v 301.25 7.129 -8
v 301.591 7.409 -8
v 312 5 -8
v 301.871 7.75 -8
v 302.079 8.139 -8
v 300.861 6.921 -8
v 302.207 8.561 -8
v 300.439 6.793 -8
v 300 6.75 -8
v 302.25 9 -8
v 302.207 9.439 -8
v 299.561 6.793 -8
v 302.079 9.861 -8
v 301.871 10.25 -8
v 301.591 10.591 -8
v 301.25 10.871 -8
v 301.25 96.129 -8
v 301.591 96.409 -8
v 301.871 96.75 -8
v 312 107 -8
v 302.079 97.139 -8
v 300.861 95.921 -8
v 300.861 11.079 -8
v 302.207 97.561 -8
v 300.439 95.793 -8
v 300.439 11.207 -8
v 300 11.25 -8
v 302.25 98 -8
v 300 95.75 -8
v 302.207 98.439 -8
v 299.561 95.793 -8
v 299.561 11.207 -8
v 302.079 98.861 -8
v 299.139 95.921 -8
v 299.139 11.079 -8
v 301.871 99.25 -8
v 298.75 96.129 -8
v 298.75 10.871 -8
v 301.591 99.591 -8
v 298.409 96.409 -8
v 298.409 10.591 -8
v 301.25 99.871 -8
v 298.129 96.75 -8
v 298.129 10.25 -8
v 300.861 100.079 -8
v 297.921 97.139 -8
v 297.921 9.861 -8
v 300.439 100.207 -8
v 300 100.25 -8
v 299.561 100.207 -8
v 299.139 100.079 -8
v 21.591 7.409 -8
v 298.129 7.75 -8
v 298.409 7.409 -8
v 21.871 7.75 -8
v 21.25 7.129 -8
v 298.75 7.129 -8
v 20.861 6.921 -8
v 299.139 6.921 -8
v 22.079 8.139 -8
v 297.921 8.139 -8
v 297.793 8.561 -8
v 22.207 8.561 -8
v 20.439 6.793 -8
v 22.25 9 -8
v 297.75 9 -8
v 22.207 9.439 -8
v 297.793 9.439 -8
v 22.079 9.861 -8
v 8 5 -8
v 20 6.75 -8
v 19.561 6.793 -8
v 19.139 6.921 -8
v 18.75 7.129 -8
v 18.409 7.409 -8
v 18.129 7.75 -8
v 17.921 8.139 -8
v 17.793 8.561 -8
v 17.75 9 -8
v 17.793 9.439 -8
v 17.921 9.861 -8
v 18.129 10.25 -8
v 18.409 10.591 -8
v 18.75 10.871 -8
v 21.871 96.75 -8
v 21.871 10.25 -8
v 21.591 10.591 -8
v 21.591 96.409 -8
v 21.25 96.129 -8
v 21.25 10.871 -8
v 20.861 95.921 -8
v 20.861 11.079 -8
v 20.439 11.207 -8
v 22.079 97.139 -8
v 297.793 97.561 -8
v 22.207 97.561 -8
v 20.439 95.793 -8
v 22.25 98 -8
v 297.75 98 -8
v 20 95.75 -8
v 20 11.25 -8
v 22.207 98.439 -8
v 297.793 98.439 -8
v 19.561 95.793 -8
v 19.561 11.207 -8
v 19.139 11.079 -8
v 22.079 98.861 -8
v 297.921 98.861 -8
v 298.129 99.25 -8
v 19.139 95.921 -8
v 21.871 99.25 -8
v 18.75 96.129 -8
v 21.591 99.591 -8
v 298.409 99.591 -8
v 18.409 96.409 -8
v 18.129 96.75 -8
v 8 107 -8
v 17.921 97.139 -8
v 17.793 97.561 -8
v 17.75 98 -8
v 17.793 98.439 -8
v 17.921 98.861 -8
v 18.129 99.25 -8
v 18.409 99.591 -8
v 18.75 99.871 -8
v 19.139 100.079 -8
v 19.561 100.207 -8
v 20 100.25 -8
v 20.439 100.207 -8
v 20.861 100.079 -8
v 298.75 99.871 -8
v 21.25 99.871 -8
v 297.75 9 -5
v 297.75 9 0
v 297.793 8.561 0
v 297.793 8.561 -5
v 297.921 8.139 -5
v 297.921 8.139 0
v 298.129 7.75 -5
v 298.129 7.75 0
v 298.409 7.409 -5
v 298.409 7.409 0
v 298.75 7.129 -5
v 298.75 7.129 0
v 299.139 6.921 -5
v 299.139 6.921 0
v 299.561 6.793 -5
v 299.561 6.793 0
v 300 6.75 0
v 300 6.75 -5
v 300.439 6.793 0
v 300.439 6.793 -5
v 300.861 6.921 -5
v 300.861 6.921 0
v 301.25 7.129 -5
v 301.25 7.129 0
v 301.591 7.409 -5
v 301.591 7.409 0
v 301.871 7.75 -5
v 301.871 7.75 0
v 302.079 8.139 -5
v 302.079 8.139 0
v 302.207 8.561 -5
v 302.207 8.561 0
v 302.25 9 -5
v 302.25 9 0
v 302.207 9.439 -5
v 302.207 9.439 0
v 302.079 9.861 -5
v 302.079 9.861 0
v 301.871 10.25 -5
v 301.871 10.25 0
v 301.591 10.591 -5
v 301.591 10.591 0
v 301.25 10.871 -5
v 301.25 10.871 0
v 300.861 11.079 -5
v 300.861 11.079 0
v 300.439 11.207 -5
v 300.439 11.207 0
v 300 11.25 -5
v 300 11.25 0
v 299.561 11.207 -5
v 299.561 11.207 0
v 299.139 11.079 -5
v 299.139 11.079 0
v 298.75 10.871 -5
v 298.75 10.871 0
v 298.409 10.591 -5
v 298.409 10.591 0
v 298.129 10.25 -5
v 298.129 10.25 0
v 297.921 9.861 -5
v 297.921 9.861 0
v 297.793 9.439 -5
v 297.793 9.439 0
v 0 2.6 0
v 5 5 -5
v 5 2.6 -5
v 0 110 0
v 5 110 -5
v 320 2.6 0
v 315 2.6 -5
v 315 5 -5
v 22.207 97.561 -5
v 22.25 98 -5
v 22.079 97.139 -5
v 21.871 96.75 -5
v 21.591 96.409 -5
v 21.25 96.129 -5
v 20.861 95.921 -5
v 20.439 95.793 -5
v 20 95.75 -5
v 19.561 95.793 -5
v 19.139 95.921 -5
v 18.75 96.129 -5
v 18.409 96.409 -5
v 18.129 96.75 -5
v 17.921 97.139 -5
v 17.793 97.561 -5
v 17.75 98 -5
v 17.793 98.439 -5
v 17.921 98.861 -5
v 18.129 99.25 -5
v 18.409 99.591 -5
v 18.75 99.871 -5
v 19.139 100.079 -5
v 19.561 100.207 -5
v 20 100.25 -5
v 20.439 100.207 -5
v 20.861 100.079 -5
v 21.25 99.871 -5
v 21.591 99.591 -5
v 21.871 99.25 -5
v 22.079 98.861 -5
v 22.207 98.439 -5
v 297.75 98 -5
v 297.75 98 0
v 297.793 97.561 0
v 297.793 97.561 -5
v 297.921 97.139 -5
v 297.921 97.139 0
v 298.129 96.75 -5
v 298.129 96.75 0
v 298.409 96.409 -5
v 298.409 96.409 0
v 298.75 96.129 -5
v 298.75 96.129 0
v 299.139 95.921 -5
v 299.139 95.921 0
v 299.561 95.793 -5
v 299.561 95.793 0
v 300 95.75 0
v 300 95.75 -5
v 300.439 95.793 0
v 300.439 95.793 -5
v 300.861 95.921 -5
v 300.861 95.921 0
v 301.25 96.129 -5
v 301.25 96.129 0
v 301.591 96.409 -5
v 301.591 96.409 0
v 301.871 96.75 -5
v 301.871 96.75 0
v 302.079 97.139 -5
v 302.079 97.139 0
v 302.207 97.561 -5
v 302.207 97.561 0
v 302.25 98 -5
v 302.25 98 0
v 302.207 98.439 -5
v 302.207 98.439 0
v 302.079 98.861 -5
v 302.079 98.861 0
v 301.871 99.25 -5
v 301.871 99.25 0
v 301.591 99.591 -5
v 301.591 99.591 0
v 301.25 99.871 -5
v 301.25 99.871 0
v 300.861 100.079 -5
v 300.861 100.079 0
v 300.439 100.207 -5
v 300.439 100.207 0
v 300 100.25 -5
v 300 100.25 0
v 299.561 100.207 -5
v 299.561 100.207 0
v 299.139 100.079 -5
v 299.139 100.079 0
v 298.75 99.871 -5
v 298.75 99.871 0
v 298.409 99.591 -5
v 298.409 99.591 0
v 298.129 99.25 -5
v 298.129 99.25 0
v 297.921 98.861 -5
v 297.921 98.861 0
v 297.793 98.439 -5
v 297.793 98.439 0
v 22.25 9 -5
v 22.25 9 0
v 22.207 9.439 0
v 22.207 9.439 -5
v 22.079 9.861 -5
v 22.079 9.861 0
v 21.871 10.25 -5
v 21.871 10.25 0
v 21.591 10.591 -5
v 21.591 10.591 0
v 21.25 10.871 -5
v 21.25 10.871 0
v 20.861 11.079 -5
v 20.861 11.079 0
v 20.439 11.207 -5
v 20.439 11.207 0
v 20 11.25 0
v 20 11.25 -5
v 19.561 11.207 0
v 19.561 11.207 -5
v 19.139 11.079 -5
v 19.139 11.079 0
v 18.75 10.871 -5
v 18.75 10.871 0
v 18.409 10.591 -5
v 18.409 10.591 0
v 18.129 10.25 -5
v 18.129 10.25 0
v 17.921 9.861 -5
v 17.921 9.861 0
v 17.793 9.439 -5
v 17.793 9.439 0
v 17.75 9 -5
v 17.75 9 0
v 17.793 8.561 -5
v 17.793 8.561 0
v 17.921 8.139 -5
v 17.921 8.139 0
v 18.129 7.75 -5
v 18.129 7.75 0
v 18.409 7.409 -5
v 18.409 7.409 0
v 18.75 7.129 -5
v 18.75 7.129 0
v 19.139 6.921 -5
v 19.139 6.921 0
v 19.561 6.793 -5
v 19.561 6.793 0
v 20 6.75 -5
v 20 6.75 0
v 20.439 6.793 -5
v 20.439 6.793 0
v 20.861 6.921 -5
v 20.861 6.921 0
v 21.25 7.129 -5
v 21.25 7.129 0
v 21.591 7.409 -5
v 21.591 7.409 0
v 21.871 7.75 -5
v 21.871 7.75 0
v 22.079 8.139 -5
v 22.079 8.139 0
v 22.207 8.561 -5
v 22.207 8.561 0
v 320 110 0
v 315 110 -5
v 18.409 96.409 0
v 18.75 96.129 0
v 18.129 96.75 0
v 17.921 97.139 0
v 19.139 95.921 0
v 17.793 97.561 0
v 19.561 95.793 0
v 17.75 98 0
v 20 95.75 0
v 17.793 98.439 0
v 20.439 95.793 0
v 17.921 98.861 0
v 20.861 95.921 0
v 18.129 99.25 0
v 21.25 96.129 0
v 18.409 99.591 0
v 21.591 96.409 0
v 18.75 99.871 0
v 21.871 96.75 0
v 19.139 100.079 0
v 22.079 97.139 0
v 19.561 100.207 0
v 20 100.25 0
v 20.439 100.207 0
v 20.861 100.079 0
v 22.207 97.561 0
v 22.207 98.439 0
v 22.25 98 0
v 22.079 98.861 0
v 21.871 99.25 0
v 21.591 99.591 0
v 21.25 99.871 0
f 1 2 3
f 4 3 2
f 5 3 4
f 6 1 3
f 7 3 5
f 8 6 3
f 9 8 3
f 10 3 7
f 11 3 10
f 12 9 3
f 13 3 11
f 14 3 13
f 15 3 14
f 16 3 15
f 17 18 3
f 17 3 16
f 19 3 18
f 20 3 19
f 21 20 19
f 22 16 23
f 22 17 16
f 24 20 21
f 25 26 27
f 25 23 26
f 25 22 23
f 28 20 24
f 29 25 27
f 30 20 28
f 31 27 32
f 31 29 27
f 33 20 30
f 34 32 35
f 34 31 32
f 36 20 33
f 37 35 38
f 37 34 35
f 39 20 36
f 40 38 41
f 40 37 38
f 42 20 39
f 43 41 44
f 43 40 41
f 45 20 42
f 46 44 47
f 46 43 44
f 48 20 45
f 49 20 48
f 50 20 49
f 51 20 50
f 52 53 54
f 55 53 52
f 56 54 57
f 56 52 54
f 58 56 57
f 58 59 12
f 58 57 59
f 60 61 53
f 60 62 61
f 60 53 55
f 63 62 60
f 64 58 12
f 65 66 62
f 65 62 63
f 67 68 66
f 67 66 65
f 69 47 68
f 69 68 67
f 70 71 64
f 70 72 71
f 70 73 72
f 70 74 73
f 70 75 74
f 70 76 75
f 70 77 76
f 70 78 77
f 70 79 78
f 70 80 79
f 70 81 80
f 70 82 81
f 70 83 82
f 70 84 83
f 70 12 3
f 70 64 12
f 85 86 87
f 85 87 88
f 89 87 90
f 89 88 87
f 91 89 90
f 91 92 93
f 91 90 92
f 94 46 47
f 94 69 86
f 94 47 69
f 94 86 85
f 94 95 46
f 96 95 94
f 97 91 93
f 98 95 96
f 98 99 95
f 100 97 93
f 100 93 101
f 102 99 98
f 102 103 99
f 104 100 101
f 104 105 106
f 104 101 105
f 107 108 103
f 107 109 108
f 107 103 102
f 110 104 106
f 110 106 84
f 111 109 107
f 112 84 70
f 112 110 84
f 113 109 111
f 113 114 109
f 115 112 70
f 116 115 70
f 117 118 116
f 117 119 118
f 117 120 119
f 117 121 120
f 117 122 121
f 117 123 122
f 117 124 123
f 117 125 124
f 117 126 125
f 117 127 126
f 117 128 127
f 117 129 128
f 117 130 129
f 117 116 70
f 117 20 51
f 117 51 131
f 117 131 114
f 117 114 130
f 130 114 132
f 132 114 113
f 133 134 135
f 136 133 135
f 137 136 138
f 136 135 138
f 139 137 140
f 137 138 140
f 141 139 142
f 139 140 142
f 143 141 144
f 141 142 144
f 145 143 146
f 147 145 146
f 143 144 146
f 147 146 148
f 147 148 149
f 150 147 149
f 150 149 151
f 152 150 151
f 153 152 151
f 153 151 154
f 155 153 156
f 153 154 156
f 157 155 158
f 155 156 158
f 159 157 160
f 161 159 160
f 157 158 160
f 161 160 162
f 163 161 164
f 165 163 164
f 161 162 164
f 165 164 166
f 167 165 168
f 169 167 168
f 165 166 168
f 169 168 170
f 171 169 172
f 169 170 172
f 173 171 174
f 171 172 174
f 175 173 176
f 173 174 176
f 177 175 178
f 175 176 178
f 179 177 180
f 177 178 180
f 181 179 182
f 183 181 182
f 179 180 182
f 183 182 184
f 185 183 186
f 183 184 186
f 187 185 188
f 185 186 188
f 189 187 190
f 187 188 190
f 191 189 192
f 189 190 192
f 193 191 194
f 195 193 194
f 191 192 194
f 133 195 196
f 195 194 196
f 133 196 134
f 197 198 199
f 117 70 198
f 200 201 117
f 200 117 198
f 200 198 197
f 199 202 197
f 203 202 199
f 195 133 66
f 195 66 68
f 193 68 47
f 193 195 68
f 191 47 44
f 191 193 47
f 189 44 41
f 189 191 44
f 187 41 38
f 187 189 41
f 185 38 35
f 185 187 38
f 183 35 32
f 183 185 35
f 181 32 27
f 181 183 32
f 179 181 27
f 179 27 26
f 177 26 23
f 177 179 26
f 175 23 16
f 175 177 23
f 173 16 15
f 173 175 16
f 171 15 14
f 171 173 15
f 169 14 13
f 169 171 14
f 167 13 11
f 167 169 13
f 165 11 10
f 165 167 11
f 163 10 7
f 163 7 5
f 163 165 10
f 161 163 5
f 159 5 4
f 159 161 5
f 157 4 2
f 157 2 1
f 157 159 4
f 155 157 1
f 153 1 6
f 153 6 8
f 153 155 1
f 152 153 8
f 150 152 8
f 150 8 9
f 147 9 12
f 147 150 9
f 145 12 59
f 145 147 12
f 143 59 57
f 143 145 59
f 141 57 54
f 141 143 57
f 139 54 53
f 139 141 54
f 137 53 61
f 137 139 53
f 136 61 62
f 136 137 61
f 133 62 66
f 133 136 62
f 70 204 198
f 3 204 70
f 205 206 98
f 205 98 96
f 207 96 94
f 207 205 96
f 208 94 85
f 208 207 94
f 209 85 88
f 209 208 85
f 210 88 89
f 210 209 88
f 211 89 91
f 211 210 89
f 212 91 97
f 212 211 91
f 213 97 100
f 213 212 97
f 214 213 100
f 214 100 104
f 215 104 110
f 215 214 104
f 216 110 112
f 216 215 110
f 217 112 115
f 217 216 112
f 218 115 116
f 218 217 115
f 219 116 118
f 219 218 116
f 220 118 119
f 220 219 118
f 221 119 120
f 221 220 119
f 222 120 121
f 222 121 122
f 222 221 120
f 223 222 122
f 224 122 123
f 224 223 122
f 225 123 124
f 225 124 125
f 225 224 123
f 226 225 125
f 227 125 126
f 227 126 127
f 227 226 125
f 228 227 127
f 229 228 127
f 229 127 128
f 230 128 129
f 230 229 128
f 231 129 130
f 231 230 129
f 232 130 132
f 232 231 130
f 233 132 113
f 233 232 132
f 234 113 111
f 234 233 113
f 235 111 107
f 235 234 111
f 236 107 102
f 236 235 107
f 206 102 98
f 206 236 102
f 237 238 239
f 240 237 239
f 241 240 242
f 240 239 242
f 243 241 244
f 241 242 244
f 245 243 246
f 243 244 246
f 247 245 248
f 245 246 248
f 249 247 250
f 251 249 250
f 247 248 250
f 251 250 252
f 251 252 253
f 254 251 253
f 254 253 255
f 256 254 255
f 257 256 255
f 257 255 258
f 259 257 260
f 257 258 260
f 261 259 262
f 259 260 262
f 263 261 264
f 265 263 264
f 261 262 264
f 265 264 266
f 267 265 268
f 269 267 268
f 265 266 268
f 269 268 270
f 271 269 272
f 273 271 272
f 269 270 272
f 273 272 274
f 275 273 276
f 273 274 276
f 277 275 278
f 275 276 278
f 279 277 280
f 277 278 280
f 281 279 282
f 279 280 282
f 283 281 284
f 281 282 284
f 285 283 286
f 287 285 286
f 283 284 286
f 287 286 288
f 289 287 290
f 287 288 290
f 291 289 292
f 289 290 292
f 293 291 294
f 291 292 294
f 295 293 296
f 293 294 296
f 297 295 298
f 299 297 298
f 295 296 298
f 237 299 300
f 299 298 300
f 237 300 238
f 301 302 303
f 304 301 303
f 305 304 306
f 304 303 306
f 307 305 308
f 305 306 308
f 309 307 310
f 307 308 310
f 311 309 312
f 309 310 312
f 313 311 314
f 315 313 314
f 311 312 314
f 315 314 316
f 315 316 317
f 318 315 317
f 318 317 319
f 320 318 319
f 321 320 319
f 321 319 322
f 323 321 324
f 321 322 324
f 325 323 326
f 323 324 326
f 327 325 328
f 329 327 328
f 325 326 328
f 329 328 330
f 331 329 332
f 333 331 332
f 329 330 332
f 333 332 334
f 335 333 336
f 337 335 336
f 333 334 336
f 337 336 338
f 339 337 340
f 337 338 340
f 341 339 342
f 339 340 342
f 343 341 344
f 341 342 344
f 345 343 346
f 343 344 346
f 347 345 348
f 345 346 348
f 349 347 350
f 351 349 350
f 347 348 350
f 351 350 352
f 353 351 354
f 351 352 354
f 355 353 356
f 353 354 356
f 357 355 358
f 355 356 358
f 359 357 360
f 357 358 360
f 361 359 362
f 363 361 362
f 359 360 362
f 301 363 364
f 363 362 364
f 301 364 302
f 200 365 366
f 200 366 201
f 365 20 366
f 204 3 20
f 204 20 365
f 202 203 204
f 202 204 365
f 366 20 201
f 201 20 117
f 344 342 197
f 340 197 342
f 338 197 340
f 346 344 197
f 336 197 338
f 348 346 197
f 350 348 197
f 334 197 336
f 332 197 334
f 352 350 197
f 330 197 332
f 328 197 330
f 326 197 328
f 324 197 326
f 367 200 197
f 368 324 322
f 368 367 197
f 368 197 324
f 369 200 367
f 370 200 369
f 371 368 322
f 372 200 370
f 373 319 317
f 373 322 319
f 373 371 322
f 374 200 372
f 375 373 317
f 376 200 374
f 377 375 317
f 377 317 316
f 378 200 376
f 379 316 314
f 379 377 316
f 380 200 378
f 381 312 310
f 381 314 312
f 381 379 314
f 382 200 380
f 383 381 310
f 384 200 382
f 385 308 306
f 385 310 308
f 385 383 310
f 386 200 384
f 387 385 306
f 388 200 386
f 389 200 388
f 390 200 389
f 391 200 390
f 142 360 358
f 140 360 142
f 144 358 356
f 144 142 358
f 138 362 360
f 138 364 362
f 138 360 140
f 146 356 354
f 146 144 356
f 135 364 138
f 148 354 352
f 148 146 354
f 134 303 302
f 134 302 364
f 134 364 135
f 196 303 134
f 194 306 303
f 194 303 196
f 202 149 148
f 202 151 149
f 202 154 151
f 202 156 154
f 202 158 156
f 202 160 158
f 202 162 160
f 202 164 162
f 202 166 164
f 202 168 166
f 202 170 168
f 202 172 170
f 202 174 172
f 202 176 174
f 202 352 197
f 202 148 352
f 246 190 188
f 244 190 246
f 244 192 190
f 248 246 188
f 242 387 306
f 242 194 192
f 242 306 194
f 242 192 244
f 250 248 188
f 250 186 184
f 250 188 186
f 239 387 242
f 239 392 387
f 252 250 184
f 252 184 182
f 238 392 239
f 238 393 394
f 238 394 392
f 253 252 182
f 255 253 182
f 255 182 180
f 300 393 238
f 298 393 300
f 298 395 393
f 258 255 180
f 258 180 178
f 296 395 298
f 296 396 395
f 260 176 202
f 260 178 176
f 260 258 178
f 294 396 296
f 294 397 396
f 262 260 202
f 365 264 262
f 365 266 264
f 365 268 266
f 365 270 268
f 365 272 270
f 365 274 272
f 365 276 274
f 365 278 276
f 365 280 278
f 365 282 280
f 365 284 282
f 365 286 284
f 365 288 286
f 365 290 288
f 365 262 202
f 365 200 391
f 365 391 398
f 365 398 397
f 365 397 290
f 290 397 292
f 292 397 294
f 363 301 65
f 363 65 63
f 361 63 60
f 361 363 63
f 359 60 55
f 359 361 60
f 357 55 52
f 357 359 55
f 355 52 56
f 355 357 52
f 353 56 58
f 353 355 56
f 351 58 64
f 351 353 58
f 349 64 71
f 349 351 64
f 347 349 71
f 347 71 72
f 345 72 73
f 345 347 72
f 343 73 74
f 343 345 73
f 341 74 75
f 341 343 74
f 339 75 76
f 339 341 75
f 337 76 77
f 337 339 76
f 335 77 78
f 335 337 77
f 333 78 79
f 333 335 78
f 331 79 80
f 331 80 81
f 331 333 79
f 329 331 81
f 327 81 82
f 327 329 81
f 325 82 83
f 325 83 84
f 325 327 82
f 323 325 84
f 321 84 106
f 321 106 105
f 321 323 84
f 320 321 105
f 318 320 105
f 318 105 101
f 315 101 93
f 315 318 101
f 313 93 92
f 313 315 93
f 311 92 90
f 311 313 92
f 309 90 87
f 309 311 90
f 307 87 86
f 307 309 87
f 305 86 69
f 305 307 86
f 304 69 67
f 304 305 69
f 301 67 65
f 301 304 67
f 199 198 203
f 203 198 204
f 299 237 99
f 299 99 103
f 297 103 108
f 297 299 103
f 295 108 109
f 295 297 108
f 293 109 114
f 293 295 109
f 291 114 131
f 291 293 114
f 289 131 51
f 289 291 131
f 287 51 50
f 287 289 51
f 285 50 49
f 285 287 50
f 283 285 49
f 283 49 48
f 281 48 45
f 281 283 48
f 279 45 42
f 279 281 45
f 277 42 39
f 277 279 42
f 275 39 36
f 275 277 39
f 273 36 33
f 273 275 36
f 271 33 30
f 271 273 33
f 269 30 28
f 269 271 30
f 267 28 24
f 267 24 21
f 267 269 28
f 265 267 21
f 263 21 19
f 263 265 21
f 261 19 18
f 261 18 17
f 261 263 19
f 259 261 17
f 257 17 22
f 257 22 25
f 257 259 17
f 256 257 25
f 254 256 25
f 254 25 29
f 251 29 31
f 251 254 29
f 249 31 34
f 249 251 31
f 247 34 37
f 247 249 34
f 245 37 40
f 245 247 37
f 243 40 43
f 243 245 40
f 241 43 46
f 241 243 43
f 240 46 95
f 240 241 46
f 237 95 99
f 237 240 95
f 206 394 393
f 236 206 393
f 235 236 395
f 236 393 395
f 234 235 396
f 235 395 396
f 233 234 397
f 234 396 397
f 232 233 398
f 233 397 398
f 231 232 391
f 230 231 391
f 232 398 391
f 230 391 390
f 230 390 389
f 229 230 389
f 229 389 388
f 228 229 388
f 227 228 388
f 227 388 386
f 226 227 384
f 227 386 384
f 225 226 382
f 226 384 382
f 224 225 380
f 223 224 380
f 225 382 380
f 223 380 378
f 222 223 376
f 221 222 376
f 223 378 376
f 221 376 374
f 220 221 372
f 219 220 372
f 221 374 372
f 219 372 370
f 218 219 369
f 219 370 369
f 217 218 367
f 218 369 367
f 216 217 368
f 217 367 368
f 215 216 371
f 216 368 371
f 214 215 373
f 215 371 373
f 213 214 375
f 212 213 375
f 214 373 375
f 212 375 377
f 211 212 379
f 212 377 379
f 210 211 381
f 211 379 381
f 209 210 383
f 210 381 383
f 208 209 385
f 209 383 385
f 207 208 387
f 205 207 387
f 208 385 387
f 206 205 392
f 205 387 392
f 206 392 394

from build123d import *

# Parameters (mm, degrees)
SKETCH1_W           = 320
SKETCH1_H           = 110
SKETCH1_R           = 2.25
BOSS_EXTRUDE1_DEPTH = 5
SKETCH2_W           = 320
SKETCH2_H           = 105
SKETCH2_R           = 2.25
BOSS_EXTRUDE2_DEPTH = 3
CHAMFER1_SIZE       = 8
CHAMFER3_SIZE       = 3
SKETCH3_W           = 7.071067812
SKETCH3_H           = 2.6
CUT_EXTRUDE1_DEPTH  = 357.223151056


with BuildPart() as part:
    # Sketch1 → Boss-Extrude1 (new body)
    with BuildSketch(Plane.XY):
        with Locations((160, 55)):
            Rectangle(SKETCH1_W, SKETCH1_H)
        with Locations((20, 9)):
            Circle(SKETCH1_R, mode=Mode.SUBTRACT)
        with Locations(Location((300, 9, 0), (0, 0, 180))):
            Circle(SKETCH1_R, mode=Mode.SUBTRACT)
        with Locations((20, 98)):
            Circle(SKETCH1_R, mode=Mode.SUBTRACT)
        with Locations(Location((300, 98, 0), (0, 0, 180))):
            Circle(SKETCH1_R, mode=Mode.SUBTRACT)
    extrude(amount=-BOSS_EXTRUDE1_DEPTH)

    # Sketch2 → Boss-Extrude2 (add)
    with BuildSketch(Plane(origin=(0, 0, -5), x_dir=(-1, 0, 0), z_dir=(0, 0, -1))):
        with Locations((-160, 57.5)):
            Rectangle(SKETCH2_W, SKETCH2_H)
        with Locations(Location((-20, 9, 0), (0, 0, 180))):
            Circle(SKETCH2_R, mode=Mode.SUBTRACT)
        with Locations((-300, 9)):
            Circle(SKETCH2_R, mode=Mode.SUBTRACT)
        with Locations(Location((-20, 98, 0), (0, 0, 180))):
            Circle(SKETCH2_R, mode=Mode.SUBTRACT)
        with Locations((-300, 98)):
            Circle(SKETCH2_R, mode=Mode.SUBTRACT)
    extrude(amount=BOSS_EXTRUDE2_DEPTH)

    # Chamfer1
    # the kernel refuses this chamfer: 8 mm, written as the material it takes off along each edge
    with BuildSketch(Plane(origin=(320, -15.573463904, -8), x_dir=(-0.9996219169112968, 0, -0.0274958766105862), z_dir=(0, 1, 0)), Plane(origin=(0, 130.573463904, -8), x_dir=(0.9996219169112968, 0, -0.027495876610586275), z_dir=(0, -1, 0))) as chamfer1_piece_1:
        Polygon((CHAMFER1_SIZE * 0.999621916911, CHAMFER1_SIZE * 0.0274958766106), (-CHAMFER1_SIZE * 0.0274958766106, CHAMFER1_SIZE * 0.999621916911), (0, 0), align=None)
    extrude(amount=146.146927807, mode=Mode.SUBTRACT)

    # Chamfer3
    chamfer3_edges = [part.edges().sort_by_distance(p)[0] for p in [
        (160, 110, -8),
    ]]
    chamfer(chamfer3_edges, length=CHAMFER3_SIZE)

    # Sketch3 → Cut-Extrude1 (cut, through all, along a direction that is not the sketch's normal)
    with BuildSketch(Plane(origin=(160, 0, -160), x_dir=(-0.7071067811865452, 0, -0.7071067811865498), z_dir=(0.7071067811865498, 0, -0.7071067811865452))):
        with Locations((-222.738636074, 1.3)):
            Rectangle(SKETCH3_W, SKETCH3_H)
    extrude(amount=-CUT_EXTRUDE1_DEPTH, dir=(1, 0, 0), mode=Mode.SUBTRACT)


solid = part.part
